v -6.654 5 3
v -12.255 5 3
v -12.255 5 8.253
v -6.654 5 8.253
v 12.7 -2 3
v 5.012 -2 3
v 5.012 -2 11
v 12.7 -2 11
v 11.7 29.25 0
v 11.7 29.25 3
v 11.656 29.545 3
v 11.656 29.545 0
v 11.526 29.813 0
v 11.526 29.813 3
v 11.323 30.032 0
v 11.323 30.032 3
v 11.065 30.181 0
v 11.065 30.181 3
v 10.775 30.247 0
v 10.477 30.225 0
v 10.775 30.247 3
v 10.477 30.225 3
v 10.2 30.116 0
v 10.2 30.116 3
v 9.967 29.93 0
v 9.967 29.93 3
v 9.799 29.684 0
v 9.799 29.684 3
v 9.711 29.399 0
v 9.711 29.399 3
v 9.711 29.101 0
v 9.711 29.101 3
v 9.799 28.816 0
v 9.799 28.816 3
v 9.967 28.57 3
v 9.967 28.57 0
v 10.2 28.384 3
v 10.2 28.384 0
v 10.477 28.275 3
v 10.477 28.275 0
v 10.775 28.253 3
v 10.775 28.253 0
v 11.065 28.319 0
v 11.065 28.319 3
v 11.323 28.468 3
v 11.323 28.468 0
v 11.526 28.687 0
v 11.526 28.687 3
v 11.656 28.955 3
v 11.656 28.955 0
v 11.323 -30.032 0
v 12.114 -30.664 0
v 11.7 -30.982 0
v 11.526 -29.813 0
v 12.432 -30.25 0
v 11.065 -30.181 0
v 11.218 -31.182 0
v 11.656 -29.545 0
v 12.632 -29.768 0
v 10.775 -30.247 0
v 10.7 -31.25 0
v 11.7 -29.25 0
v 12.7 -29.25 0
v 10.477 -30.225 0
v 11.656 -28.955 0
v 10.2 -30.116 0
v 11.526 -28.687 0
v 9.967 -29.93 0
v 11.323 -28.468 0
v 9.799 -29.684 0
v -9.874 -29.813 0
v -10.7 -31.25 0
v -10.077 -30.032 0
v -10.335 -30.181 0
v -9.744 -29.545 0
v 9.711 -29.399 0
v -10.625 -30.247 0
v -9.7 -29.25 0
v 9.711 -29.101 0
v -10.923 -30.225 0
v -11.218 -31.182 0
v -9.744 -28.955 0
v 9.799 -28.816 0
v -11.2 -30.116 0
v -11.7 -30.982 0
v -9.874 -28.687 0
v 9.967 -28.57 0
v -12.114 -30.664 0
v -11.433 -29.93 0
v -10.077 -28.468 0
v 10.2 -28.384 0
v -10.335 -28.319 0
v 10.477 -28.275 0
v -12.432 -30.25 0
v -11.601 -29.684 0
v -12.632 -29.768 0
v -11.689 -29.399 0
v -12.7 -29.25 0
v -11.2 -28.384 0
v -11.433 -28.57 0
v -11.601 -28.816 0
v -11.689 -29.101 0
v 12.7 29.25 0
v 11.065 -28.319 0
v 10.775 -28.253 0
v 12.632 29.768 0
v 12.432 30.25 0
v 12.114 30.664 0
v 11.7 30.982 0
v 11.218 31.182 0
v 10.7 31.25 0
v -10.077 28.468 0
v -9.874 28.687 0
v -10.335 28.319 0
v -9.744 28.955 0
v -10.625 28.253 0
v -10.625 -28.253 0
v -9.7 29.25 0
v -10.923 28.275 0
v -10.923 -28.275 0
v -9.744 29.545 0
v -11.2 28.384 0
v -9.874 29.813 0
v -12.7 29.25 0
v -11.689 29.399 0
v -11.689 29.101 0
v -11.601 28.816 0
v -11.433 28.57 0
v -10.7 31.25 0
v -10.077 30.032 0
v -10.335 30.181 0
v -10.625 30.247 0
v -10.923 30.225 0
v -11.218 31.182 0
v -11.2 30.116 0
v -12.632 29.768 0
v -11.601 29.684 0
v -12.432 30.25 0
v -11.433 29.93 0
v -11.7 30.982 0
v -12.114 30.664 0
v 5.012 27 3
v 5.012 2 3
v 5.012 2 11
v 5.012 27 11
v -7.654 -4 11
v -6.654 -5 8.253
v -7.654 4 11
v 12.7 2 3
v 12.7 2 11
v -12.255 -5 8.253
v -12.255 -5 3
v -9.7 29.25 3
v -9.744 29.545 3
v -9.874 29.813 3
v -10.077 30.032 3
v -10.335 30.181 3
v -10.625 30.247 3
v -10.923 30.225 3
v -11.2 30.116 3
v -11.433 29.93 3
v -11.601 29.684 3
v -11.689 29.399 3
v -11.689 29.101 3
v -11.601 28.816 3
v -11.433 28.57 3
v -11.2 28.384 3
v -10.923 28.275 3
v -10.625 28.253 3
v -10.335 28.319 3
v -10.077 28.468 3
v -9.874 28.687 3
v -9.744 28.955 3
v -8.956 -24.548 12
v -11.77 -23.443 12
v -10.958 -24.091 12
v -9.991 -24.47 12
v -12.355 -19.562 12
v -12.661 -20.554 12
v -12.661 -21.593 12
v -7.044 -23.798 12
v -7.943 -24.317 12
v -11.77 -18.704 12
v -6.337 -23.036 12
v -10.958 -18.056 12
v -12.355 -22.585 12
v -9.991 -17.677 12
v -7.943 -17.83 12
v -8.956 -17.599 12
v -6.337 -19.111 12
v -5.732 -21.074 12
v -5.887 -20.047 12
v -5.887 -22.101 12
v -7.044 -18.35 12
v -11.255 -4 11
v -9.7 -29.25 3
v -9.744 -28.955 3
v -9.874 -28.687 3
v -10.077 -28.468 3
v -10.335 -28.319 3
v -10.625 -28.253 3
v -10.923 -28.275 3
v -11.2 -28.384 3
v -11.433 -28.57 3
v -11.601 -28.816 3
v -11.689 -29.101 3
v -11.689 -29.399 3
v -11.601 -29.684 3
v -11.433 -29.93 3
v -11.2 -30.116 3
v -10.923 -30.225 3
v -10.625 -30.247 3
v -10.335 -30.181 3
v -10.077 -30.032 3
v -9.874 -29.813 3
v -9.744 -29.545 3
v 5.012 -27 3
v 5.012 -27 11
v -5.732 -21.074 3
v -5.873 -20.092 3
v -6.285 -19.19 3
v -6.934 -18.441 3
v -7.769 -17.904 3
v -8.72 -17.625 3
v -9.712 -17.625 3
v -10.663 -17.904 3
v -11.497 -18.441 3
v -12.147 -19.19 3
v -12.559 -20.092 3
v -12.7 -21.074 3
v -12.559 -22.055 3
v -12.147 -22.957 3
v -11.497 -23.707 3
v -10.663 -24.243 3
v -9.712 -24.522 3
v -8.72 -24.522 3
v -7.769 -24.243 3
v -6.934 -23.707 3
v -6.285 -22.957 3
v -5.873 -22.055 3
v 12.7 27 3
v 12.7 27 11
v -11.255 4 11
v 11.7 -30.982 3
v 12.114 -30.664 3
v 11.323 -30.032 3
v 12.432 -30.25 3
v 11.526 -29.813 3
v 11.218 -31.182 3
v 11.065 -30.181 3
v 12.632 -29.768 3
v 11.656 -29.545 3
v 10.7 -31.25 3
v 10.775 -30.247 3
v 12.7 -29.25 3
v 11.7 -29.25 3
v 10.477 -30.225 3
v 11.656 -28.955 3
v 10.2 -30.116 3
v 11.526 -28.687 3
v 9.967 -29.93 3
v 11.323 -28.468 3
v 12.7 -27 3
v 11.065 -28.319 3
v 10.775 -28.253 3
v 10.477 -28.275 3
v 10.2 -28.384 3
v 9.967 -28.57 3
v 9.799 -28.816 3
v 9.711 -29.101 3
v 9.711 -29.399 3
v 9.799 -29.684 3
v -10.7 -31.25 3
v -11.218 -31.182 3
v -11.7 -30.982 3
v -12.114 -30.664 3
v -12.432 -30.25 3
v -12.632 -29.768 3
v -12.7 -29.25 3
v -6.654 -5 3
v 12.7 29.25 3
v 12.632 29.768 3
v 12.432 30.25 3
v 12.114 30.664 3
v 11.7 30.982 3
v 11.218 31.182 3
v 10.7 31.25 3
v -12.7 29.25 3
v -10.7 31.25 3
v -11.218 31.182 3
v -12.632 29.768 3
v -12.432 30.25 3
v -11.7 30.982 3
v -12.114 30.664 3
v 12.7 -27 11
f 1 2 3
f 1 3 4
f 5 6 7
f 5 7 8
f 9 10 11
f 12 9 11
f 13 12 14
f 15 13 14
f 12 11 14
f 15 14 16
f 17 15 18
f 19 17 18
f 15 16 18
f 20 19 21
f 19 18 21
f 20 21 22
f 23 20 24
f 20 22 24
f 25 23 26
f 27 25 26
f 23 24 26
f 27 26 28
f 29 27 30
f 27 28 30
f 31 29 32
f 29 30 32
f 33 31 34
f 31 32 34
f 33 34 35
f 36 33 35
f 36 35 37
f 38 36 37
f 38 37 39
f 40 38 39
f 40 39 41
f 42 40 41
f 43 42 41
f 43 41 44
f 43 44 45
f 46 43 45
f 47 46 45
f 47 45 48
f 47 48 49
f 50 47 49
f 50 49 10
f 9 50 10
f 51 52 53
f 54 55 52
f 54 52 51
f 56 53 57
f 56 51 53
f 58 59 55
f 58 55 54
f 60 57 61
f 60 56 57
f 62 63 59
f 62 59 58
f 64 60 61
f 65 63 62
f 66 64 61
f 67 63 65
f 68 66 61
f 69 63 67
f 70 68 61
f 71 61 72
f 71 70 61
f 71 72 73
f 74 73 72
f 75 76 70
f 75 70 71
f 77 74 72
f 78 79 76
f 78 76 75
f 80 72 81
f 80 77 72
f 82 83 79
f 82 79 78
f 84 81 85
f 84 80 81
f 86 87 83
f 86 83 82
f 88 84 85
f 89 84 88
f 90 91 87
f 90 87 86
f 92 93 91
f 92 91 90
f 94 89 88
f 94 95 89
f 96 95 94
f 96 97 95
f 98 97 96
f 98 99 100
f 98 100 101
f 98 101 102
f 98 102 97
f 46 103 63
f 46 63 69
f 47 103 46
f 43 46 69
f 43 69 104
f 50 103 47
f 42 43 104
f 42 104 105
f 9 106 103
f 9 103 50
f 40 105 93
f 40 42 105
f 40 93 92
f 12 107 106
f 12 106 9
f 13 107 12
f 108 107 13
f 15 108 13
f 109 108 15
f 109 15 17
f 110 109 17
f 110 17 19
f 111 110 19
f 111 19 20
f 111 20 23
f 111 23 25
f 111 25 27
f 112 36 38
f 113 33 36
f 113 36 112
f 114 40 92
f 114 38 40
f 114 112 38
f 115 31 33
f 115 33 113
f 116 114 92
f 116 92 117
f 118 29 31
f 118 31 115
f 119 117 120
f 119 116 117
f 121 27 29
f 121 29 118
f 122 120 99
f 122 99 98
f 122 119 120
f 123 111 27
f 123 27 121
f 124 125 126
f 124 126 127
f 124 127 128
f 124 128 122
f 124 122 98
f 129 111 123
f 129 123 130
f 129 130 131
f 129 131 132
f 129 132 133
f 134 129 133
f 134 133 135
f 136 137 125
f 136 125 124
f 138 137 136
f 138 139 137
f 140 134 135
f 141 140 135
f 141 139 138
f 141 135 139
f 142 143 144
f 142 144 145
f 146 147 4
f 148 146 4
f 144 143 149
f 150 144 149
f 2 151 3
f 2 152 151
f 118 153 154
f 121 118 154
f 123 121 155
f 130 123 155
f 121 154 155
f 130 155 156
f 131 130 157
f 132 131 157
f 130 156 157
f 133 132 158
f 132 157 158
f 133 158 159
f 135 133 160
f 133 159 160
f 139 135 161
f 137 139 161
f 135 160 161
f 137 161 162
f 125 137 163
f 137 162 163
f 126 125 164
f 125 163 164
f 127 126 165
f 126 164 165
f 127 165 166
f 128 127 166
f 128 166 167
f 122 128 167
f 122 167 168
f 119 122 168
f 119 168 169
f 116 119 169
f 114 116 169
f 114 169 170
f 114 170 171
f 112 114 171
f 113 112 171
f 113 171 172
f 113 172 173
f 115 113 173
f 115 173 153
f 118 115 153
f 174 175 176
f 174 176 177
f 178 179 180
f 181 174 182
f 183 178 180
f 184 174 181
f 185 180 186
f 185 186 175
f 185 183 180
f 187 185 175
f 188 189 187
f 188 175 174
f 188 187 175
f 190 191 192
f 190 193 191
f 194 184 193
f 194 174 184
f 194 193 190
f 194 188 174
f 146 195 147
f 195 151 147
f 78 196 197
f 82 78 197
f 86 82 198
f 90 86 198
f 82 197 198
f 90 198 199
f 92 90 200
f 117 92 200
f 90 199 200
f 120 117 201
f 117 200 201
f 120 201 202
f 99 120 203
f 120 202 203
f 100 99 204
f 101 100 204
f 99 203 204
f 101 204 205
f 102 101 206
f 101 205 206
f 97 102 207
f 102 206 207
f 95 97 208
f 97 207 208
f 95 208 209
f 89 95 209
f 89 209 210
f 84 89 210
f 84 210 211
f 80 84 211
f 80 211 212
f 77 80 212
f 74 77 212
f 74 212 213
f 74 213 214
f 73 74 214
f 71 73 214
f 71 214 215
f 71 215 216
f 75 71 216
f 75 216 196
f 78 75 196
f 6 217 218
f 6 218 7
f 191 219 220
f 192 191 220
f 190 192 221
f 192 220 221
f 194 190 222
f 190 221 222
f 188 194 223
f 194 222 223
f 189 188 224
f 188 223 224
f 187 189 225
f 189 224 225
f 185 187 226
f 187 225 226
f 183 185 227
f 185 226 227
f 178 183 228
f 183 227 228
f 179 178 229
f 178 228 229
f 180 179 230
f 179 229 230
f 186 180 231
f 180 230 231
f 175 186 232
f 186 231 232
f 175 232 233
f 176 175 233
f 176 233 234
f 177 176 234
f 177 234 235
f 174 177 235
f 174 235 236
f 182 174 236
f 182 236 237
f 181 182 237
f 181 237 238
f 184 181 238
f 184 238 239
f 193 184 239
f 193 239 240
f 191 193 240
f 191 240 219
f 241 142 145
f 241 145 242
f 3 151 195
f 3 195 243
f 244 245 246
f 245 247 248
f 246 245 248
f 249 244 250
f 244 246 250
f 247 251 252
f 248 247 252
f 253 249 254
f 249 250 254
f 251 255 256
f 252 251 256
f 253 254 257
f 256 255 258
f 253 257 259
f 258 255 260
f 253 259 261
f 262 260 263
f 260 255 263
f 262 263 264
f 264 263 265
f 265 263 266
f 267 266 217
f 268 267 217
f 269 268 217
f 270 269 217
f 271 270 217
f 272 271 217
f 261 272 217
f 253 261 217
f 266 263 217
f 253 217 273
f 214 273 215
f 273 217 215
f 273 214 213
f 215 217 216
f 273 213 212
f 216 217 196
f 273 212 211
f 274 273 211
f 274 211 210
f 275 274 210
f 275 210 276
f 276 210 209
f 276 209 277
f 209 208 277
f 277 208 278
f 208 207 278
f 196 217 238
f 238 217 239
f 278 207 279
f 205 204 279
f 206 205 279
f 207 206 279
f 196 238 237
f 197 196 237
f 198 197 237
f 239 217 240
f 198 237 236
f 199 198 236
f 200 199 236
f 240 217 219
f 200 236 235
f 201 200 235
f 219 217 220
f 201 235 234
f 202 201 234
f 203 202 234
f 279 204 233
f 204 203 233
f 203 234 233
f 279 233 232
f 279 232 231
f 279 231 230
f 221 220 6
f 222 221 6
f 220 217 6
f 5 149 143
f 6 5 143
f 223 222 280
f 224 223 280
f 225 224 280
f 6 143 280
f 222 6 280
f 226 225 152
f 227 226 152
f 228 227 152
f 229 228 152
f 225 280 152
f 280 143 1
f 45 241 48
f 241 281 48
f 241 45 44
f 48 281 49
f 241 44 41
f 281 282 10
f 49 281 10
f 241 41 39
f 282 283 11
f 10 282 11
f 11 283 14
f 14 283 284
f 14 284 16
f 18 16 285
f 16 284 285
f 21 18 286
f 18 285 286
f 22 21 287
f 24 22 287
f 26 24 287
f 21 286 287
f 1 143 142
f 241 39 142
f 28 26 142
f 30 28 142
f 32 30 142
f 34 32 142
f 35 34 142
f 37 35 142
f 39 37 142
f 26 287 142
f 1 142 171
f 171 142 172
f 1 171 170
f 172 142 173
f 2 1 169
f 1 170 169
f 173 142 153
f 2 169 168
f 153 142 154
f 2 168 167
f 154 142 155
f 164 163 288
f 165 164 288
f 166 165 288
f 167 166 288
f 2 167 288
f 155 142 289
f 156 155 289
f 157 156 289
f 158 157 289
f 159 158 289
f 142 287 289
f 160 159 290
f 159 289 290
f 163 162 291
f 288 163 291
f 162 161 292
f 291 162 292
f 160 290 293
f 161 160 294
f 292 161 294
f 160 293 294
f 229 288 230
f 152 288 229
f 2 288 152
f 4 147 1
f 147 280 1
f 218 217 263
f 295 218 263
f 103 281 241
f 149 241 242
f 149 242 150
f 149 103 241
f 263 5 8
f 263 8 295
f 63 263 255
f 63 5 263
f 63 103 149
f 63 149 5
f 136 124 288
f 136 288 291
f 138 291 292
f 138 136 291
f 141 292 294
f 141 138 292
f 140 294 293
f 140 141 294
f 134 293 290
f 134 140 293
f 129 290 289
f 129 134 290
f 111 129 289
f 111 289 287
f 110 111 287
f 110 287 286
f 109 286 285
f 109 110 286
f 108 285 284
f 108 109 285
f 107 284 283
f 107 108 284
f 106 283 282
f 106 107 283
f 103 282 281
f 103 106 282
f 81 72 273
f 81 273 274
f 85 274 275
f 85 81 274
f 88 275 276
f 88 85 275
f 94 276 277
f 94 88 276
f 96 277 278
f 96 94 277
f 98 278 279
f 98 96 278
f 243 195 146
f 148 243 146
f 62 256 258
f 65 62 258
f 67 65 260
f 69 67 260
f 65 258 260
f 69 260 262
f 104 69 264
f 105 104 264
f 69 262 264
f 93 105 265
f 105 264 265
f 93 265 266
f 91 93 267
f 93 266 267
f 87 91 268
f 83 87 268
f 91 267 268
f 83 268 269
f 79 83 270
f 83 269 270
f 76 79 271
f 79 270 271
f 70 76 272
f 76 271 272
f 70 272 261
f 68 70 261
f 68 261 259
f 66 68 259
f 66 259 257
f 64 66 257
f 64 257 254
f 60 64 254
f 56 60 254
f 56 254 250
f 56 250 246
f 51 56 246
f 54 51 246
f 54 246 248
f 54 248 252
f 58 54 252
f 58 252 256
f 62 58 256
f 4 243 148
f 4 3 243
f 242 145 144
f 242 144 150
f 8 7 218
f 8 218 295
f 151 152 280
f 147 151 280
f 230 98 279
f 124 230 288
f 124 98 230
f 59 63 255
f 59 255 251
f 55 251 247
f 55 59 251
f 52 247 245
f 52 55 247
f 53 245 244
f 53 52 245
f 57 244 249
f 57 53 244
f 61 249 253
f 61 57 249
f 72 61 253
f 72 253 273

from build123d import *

# Parameters (mm, degrees)
BOSS_EXTRUDE2_DEPTH = 3
CUT_EXTRUDE1_REACH  = 5
SKETCH2_R           = 1
SKETCH3_W           = 5.601007624
SKETCH3_H           = 10
BOSS_EXTRUDE3_DEPTH = 8
CHAMFER1_SIZE       = 1
CHAMFER1_SIZE2      = 2.747477419
CHAMFER2_SIZE       = 1
CHAMFER2_SIZE2      = 2.747477419
CHAMFER3_SIZE       = 1
CHAMFER3_SIZE2      = 2.747477419
CHAMFER4_SIZE       = 1
CHAMFER4_SIZE2      = 2.747477419
SKETCH4_W           = 7.688117752
SKETCH4_H           = 25
BOSS_EXTRUDE4_DEPTH = 8
SKETCH5_R           = 3.48412519
BOSS_EXTRUDE5_DEPTH = 9


with BuildPart() as part:
    # Sketch1 → Boss-Extrude2 (new body)
    with BuildSketch(Plane.XY):
        with BuildLine():
            Line((-10.7, 31.25), (10.7, 31.25))
            ThreePointArc((10.7, 31.25), (12.114213562, 30.664213562), (12.7, 29.25))
            Line((12.7, 29.25), (12.7, -29.25))
            ThreePointArc((12.7, -29.25), (12.114213562, -30.664213562), (10.7, -31.25))
            Line((10.7, -31.25), (-10.7, -31.25))
            ThreePointArc((-10.7, -31.25), (-12.114213562, -30.664213562), (-12.7, -29.25))
            Line((-12.7, -29.25), (-12.7, 29.25))
            ThreePointArc((-12.7, 29.25), (-12.114213562, 30.664213562), (-10.7, 31.25))
        make_face()
    extrude(amount=BOSS_EXTRUDE2_DEPTH)

    # Sketch2 → Cut-Extrude1 (cut, up to next)
    with BuildSketch(Plane.XY.offset(3), mode=Mode.PRIVATE) as cut_extrude1_sk1:
        with Locations((-10.7, 29.25)):
            Circle(SKETCH2_R)
    cut_extrude1_tool1 = extrude(cut_extrude1_sk1.sketch, amount=-CUT_EXTRUDE1_REACH, mode=Mode.PRIVATE) & part.part
    add(cut_extrude1_tool1.solids().sort_by_distance((-10.7, 29.25, 3))[0], mode=Mode.SUBTRACT)
    # Sketch2 → Cut-Extrude1 (cut, up to next)
    with BuildSketch(Plane.XY.offset(3), mode=Mode.PRIVATE) as cut_extrude1_sk2:
        with Locations((10.7, 29.25)):
            Circle(SKETCH2_R)
    cut_extrude1_tool2 = extrude(cut_extrude1_sk2.sketch, amount=-CUT_EXTRUDE1_REACH, mode=Mode.PRIVATE) & part.part
    add(cut_extrude1_tool2.solids().sort_by_distance((10.7, 29.25, 3))[0], mode=Mode.SUBTRACT)
    # Sketch2 → Cut-Extrude1 (cut, up to next)
    with BuildSketch(Plane.XY.offset(3), mode=Mode.PRIVATE) as cut_extrude1_sk3:
        with Locations((10.7, -29.25)):
            Circle(SKETCH2_R)
    cut_extrude1_tool3 = extrude(cut_extrude1_sk3.sketch, amount=-CUT_EXTRUDE1_REACH, mode=Mode.PRIVATE) & part.part
    add(cut_extrude1_tool3.solids().sort_by_distance((10.7, -29.25, 3))[0], mode=Mode.SUBTRACT)
    # Sketch2 → Cut-Extrude1 (cut, up to next)
    with BuildSketch(Plane.XY.offset(3), mode=Mode.PRIVATE) as cut_extrude1_sk4:
        with Locations((-10.7, -29.25)):
            Circle(SKETCH2_R)
    cut_extrude1_tool4 = extrude(cut_extrude1_sk4.sketch, amount=-CUT_EXTRUDE1_REACH, mode=Mode.PRIVATE) & part.part
    add(cut_extrude1_tool4.solids().sort_by_distance((-10.7, -29.25, 3))[0], mode=Mode.SUBTRACT)

    # Sketch3 → Boss-Extrude3 (add)
    with BuildSketch(Plane.XY.offset(3)):
        with Locations((-9.454083627, 0)):
            Rectangle(SKETCH3_W, SKETCH3_H)
    extrude(amount=BOSS_EXTRUDE3_DEPTH)

    # Chamfer1
    chamfer1_edges = [part.edges().sort_by_distance(p)[0] for p in [
        (-9.454083627, -5, 11),
    ]]
    chamfer1_side = [part.faces().sort_by_distance(p)[0] for p in [
        (-9.454083627, 0, 11),
    ]]
    chamfer(chamfer1_edges, length=CHAMFER1_SIZE, length2=CHAMFER1_SIZE2, reference=chamfer1_side[0])

    # Chamfer2
    chamfer2_edges = [part.edges().sort_by_distance(p)[0] for p in [
        (-9.454083627, 5, 11),
    ]]
    chamfer2_side = [part.faces().sort_by_distance(p)[0] for p in [
        (-9.454083627, 0.5, 11),
    ]]
    chamfer(chamfer2_edges, length=CHAMFER2_SIZE, length2=CHAMFER2_SIZE2, reference=chamfer2_side[0])

    # Chamfer3
    chamfer3_edges = [part.edges().sort_by_distance(p)[0] for p in [
        (-12.254587439, 0, 11),
    ]]
    chamfer3_side = [part.faces().sort_by_distance(p)[0] for p in [
        (-9.454083627, 0, 11),
    ]]
    chamfer(chamfer3_edges, length=CHAMFER3_SIZE, length2=CHAMFER3_SIZE2, reference=chamfer3_side[0])

    # Chamfer4
    chamfer4_edges = [part.edges().sort_by_distance(p)[0] for p in [
        (-6.653579815, 0, 11),
    ]]
    chamfer4_side = [part.faces().sort_by_distance(p)[0] for p in [
        (-8.954083627, 0, 11),
    ]]
    chamfer(chamfer4_edges, length=CHAMFER4_SIZE, length2=CHAMFER4_SIZE2, reference=chamfer4_side[0])

    # Sketch4 → Boss-Extrude4 (add)
    with BuildSketch(Plane.XY.offset(3)):
        with Locations((8.855941124, -14.499959716)):
            Rectangle(SKETCH4_W, SKETCH4_H)
        with Locations((8.855941124, 14.499959716)):
            Rectangle(SKETCH4_W, SKETCH4_H)
    extrude(amount=BOSS_EXTRUDE4_DEPTH)

    # Sketch5 → Boss-Extrude5 (add)
    with BuildSketch(Plane.XY.offset(3)):
        with Locations((-9.21587481, -21.073650693)):
            Circle(SKETCH5_R)
    extrude(amount=BOSS_EXTRUDE5_DEPTH)


solid = part.part
